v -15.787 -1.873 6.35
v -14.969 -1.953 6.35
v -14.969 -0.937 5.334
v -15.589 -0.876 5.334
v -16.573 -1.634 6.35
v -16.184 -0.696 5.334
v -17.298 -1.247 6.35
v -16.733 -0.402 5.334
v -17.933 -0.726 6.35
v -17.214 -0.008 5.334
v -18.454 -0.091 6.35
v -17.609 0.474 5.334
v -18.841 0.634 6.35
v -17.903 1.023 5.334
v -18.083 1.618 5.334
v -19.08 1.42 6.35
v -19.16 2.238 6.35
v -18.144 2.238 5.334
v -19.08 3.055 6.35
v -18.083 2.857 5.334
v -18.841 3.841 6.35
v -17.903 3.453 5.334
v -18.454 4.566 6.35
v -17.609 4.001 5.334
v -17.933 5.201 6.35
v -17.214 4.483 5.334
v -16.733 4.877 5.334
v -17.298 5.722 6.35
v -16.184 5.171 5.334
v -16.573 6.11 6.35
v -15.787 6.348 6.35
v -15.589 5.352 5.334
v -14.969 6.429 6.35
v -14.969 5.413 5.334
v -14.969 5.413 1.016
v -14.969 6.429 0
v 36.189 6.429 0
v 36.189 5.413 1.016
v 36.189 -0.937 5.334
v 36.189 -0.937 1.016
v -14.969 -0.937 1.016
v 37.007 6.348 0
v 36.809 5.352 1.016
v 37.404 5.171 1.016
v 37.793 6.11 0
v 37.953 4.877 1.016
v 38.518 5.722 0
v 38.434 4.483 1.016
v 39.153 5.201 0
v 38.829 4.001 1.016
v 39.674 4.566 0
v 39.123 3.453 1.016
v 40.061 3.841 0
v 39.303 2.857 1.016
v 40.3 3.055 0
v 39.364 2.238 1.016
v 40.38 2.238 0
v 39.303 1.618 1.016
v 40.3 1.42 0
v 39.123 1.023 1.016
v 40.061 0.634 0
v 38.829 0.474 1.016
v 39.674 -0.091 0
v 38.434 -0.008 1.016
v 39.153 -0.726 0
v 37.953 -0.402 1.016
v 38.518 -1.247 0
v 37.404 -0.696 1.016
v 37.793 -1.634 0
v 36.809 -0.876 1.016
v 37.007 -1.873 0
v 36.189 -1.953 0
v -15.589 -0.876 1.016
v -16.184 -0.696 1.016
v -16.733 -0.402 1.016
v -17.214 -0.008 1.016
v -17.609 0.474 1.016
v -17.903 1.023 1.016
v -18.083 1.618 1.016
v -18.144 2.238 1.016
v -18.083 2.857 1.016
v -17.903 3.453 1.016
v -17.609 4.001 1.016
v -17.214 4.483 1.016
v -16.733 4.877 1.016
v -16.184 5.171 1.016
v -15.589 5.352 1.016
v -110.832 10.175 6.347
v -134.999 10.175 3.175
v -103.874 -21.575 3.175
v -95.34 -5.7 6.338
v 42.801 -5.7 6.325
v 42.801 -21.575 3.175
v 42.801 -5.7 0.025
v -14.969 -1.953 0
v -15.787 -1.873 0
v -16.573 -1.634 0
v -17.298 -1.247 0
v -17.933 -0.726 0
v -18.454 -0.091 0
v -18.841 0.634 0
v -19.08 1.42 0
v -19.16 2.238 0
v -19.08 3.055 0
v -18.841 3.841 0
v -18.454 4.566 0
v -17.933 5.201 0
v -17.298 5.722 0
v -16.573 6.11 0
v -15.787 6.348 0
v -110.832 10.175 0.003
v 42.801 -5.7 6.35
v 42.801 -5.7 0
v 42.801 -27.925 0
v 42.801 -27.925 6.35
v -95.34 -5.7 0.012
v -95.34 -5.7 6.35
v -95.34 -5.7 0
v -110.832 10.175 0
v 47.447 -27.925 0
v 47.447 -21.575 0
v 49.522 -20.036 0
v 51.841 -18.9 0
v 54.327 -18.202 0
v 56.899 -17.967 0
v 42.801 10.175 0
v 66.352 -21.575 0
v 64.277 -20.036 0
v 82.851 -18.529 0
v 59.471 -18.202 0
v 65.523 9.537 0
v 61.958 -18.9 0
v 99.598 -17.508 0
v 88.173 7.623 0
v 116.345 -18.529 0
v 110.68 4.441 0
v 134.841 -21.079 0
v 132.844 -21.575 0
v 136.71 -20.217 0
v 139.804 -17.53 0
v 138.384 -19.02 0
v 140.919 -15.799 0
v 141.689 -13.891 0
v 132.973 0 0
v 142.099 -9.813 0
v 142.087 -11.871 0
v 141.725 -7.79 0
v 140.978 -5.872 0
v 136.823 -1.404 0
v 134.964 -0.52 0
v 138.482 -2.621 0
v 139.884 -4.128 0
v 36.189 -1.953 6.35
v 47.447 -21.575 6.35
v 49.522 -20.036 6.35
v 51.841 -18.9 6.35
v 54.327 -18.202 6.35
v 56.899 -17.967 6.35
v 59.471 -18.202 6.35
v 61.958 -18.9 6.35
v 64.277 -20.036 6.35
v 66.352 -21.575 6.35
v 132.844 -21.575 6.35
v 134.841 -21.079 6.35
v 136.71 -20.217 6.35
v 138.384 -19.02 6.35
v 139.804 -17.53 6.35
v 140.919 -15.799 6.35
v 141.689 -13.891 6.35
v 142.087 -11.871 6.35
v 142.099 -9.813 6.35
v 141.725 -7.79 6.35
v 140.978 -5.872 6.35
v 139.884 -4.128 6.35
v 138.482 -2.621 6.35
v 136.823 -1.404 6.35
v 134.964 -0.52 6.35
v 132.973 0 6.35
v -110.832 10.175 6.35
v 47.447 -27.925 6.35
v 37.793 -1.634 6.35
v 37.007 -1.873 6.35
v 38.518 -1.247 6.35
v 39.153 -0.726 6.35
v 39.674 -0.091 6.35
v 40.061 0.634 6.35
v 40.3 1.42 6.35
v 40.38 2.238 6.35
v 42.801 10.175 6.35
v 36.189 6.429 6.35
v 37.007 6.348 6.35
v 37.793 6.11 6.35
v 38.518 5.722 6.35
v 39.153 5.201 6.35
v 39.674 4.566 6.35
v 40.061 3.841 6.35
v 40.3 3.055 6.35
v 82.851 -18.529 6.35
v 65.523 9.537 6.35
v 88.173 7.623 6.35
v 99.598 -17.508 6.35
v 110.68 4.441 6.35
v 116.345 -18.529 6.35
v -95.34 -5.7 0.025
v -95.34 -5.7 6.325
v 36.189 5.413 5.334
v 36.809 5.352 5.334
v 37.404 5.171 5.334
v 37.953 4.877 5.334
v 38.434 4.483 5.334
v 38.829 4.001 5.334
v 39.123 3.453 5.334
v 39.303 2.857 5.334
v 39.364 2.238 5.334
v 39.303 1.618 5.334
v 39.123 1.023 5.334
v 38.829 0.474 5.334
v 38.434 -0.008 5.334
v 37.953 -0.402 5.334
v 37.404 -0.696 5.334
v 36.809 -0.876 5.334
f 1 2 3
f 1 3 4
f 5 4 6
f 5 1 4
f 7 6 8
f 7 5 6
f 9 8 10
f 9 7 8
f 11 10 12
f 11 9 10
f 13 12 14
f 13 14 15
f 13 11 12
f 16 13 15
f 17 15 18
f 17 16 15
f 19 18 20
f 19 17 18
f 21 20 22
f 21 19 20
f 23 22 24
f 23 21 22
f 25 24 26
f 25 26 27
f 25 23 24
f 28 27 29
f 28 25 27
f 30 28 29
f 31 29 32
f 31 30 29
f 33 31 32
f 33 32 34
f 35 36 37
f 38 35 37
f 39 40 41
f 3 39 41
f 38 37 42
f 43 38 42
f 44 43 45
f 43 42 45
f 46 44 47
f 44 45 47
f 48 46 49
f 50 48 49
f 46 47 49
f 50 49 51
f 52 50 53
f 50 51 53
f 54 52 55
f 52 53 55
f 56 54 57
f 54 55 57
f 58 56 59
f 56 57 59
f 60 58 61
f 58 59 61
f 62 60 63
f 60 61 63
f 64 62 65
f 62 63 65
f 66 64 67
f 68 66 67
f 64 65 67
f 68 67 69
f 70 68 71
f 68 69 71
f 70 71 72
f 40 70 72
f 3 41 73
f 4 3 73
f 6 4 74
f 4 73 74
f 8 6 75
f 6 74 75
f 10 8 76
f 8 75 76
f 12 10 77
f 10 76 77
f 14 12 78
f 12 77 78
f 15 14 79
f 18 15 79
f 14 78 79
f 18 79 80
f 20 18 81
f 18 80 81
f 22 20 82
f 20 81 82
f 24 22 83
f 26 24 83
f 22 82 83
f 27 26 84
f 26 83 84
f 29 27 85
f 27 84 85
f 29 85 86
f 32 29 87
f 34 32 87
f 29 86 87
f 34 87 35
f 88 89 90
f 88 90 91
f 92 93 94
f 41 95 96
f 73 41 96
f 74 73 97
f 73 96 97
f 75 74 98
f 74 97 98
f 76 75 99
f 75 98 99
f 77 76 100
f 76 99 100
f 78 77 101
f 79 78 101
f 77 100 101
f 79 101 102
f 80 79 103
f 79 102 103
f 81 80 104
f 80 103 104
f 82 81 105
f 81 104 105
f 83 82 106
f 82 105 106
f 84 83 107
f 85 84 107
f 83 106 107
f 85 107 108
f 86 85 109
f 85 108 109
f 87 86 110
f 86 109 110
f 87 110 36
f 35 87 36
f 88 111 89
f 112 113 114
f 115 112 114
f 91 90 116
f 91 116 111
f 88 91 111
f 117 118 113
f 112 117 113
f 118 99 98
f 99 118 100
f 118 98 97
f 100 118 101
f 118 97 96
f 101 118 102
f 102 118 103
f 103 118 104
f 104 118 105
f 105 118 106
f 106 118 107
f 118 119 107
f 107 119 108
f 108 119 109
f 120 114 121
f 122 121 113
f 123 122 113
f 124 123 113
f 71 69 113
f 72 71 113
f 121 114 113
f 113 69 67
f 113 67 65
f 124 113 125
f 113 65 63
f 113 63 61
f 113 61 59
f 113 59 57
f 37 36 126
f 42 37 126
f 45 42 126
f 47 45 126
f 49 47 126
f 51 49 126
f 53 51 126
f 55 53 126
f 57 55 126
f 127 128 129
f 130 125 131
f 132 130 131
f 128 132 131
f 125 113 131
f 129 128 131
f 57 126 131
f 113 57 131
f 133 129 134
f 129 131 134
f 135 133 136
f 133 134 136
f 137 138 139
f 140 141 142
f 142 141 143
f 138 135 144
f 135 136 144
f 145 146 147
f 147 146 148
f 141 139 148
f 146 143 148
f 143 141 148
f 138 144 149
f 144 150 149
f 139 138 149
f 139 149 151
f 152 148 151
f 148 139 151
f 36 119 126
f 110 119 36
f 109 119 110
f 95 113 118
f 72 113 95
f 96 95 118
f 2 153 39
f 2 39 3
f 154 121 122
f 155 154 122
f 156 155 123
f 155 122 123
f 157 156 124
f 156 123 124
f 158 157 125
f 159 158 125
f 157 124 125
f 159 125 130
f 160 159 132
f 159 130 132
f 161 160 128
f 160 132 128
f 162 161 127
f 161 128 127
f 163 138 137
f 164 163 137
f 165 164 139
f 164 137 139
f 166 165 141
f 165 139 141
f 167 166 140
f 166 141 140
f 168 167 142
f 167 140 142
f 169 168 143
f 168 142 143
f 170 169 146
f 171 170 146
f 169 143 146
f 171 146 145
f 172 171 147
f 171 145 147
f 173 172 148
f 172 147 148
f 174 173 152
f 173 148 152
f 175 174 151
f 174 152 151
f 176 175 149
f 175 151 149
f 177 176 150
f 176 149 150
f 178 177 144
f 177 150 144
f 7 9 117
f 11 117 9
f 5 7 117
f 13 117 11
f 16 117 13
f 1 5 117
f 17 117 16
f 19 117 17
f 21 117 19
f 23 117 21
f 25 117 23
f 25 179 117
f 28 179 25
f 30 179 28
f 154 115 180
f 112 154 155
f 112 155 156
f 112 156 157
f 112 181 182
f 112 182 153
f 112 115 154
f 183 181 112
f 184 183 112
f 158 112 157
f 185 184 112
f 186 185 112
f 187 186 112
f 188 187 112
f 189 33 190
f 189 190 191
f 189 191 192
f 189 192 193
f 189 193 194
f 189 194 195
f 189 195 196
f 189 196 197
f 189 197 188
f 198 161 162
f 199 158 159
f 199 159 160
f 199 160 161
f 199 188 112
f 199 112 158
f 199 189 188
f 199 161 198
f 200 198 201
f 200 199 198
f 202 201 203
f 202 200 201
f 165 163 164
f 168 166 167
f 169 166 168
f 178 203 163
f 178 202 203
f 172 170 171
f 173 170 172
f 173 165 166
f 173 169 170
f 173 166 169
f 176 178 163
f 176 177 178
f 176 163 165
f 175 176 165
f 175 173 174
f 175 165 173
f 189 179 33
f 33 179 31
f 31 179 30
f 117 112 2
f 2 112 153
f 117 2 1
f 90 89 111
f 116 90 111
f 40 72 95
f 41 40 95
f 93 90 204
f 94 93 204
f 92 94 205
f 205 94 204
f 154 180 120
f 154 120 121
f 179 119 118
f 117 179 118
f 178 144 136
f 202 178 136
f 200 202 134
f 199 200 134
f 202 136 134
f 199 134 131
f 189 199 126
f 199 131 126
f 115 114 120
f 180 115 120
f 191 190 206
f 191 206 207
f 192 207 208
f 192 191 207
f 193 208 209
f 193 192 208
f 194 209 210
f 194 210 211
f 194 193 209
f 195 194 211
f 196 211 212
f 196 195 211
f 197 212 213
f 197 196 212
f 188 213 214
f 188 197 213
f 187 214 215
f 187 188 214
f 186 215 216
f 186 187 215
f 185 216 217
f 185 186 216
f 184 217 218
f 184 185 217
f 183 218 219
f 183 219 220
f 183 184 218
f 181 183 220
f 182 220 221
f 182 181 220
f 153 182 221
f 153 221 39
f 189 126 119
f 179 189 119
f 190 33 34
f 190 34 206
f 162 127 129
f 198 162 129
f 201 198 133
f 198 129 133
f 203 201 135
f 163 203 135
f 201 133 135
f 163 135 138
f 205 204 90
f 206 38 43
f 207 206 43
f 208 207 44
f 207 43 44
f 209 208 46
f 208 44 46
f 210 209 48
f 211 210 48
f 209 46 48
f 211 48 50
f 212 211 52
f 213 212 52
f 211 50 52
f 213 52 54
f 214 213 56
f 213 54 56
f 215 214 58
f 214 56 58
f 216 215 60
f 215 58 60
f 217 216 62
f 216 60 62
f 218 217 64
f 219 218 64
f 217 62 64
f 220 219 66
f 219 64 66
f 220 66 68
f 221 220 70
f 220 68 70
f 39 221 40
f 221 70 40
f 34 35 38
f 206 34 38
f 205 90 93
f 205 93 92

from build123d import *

# Parameters (mm, degrees)
F1_DEPTH    = 6.35
F2_DEPTH    = 6.35
F3_DEPTH    = 6.35
F4_T1_DEPTH = 229.8266509334
F5_T1_DEPTH = 134.2211036102
F6_SIZE     = 1.016


# Not quite as in the source:
# - a fillet or chamfer that OpenCascade refuses, or shapes differently, is made with other operations: its cross-section is extruded or revolved along the edge and cut away or added


with BuildPart() as f1:
    # F0 (on Top) → F1 (new body)
    with BuildSketch(Plane.XY):
        with BuildLine():
            Line((42.8011300921, 10.175053092), (-110.832311213, 10.175053092))
            Line((-110.832311213, 10.175053092), (-95.3400209546, -5.699946908))
            Line((-95.3400209546, -5.699946908), (42.8011300921, -5.699946908))
            Line((42.8011300921, -5.699946908), (42.8011300921, -21.574946908))
            Line((42.8011300921, -21.574946908), (42.8011300921, -27.924946908))
            Line((42.8011300921, -27.924946908), (47.4472232163, -27.924946908))
            Line((47.4472232163, -27.924946908), (47.4472232163, -21.574946908))
            ThreePointArc((47.4472232163, -21.574946908), (56.8993929774, -17.9668468512), (66.3515627384, -21.574946908))
            ThreePointArc((66.3515627384, -21.574946908), (99.5976924896, -17.5079847975), (132.8438222408, -21.574946908))
            ThreePointArc((132.8438222408, -21.574946908), (142.1418780211, -10.84272639), (132.9729259014, 0))
            ThreePointArc((132.9729259014, 0), (88.1731602013, 7.6232435083), (42.8011300921, 10.175053092))
        make_face()
        with BuildLine():
            Line((-14.9693377316, 5.412553092), (36.1893251538, 5.412553092))
            ThreePointArc((36.1893251538, 5.412553092), (39.3643251538, 2.237553092), (36.1893251538, -0.937446908))
            Line((36.1893251538, -0.937446908), (-14.9693377316, -0.937446908))
            ThreePointArc((-14.9693377316, -0.937446908), (-18.1443377316, 2.237553092), (-14.9693377316, 5.412553092))
        make_face(mode=Mode.SUBTRACT)
    extrude(amount=F1_DEPTH)

    # F6
    f6_edges = [f1.edges().sort_by_distance(p)[0] for p in [
        (10.609994, 5.412553, 6.35),
        (-18.144338, 2.237553, 6.35),
        (10.609994, -0.937447, 6.35),
        (39.364325, 2.237553, 6.35),
        (10.609994, -0.937447, 0),
        (-18.144338, 2.237553, 0),
        (39.364325, 2.237553, 0),
        (10.609994, 5.412553, 0),
    ]]
    chamfer(f6_edges, length=F6_SIZE)


with BuildPart() as f2:
    # F0 (on Top) → F2 (new body)
    with BuildSketch(Plane.XY):
        Polygon((-95.3400209546, -5.699946908), (-103.8739830256, -21.574946908), (42.8011300921, -21.574946908), (42.8011300921, -5.699946908), align=None)
    extrude(amount=F2_DEPTH)

    # F4: chamfer of 16.002 x 3.175 on 2 edges, made by hand

    # F4_s2 → F4_t1 (cut)
    with BuildSketch(Plane.YZ.offset(-145.4497519334)):
        Polygon((-21.574946908, 3.175), (-5.572946908, 6.35), (-21.574946908, 6.35), align=None)
        Polygon((-21.574946908, 3.175), (-5.572946908, 0), (-21.574946908, 0), align=None)
    extrude(amount=F4_T1_DEPTH, mode=Mode.SUBTRACT)


with BuildPart() as f3:
    # F0 (on Top) → F3 (new body)
    with BuildSketch(Plane.XY):
        Polygon((-110.832311213, 10.175053092), (-134.9988699079, 10.175053092), (-103.8739830256, -21.574946908), (-95.3400209546, -5.699946908), align=None)
    extrude(amount=F3_DEPTH)

    # F5: chamfer of 17.272 x 3.175 on 2 edges, made by hand

    # F5_s2 → F5_t1 (cut)
    with BuildSketch(Plane(origin=(-102.6616678748, 104.7235277465, 0), x_dir=(0, 0, 1), z_dir=(0.7000420043, -0.714101668, 0))):
        Polygon((3.175, 89.2799536123), (6.35, 72.0079536123), (6.35, 89.2799536123), align=None)
        Polygon((3.175, 89.2799536123), (0, 72.0079536123), (0, 89.2799536123), align=None)
    extrude(amount=F5_T1_DEPTH, mode=Mode.SUBTRACT)


solid = Compound([f1.part, f2.part, f3.part])
